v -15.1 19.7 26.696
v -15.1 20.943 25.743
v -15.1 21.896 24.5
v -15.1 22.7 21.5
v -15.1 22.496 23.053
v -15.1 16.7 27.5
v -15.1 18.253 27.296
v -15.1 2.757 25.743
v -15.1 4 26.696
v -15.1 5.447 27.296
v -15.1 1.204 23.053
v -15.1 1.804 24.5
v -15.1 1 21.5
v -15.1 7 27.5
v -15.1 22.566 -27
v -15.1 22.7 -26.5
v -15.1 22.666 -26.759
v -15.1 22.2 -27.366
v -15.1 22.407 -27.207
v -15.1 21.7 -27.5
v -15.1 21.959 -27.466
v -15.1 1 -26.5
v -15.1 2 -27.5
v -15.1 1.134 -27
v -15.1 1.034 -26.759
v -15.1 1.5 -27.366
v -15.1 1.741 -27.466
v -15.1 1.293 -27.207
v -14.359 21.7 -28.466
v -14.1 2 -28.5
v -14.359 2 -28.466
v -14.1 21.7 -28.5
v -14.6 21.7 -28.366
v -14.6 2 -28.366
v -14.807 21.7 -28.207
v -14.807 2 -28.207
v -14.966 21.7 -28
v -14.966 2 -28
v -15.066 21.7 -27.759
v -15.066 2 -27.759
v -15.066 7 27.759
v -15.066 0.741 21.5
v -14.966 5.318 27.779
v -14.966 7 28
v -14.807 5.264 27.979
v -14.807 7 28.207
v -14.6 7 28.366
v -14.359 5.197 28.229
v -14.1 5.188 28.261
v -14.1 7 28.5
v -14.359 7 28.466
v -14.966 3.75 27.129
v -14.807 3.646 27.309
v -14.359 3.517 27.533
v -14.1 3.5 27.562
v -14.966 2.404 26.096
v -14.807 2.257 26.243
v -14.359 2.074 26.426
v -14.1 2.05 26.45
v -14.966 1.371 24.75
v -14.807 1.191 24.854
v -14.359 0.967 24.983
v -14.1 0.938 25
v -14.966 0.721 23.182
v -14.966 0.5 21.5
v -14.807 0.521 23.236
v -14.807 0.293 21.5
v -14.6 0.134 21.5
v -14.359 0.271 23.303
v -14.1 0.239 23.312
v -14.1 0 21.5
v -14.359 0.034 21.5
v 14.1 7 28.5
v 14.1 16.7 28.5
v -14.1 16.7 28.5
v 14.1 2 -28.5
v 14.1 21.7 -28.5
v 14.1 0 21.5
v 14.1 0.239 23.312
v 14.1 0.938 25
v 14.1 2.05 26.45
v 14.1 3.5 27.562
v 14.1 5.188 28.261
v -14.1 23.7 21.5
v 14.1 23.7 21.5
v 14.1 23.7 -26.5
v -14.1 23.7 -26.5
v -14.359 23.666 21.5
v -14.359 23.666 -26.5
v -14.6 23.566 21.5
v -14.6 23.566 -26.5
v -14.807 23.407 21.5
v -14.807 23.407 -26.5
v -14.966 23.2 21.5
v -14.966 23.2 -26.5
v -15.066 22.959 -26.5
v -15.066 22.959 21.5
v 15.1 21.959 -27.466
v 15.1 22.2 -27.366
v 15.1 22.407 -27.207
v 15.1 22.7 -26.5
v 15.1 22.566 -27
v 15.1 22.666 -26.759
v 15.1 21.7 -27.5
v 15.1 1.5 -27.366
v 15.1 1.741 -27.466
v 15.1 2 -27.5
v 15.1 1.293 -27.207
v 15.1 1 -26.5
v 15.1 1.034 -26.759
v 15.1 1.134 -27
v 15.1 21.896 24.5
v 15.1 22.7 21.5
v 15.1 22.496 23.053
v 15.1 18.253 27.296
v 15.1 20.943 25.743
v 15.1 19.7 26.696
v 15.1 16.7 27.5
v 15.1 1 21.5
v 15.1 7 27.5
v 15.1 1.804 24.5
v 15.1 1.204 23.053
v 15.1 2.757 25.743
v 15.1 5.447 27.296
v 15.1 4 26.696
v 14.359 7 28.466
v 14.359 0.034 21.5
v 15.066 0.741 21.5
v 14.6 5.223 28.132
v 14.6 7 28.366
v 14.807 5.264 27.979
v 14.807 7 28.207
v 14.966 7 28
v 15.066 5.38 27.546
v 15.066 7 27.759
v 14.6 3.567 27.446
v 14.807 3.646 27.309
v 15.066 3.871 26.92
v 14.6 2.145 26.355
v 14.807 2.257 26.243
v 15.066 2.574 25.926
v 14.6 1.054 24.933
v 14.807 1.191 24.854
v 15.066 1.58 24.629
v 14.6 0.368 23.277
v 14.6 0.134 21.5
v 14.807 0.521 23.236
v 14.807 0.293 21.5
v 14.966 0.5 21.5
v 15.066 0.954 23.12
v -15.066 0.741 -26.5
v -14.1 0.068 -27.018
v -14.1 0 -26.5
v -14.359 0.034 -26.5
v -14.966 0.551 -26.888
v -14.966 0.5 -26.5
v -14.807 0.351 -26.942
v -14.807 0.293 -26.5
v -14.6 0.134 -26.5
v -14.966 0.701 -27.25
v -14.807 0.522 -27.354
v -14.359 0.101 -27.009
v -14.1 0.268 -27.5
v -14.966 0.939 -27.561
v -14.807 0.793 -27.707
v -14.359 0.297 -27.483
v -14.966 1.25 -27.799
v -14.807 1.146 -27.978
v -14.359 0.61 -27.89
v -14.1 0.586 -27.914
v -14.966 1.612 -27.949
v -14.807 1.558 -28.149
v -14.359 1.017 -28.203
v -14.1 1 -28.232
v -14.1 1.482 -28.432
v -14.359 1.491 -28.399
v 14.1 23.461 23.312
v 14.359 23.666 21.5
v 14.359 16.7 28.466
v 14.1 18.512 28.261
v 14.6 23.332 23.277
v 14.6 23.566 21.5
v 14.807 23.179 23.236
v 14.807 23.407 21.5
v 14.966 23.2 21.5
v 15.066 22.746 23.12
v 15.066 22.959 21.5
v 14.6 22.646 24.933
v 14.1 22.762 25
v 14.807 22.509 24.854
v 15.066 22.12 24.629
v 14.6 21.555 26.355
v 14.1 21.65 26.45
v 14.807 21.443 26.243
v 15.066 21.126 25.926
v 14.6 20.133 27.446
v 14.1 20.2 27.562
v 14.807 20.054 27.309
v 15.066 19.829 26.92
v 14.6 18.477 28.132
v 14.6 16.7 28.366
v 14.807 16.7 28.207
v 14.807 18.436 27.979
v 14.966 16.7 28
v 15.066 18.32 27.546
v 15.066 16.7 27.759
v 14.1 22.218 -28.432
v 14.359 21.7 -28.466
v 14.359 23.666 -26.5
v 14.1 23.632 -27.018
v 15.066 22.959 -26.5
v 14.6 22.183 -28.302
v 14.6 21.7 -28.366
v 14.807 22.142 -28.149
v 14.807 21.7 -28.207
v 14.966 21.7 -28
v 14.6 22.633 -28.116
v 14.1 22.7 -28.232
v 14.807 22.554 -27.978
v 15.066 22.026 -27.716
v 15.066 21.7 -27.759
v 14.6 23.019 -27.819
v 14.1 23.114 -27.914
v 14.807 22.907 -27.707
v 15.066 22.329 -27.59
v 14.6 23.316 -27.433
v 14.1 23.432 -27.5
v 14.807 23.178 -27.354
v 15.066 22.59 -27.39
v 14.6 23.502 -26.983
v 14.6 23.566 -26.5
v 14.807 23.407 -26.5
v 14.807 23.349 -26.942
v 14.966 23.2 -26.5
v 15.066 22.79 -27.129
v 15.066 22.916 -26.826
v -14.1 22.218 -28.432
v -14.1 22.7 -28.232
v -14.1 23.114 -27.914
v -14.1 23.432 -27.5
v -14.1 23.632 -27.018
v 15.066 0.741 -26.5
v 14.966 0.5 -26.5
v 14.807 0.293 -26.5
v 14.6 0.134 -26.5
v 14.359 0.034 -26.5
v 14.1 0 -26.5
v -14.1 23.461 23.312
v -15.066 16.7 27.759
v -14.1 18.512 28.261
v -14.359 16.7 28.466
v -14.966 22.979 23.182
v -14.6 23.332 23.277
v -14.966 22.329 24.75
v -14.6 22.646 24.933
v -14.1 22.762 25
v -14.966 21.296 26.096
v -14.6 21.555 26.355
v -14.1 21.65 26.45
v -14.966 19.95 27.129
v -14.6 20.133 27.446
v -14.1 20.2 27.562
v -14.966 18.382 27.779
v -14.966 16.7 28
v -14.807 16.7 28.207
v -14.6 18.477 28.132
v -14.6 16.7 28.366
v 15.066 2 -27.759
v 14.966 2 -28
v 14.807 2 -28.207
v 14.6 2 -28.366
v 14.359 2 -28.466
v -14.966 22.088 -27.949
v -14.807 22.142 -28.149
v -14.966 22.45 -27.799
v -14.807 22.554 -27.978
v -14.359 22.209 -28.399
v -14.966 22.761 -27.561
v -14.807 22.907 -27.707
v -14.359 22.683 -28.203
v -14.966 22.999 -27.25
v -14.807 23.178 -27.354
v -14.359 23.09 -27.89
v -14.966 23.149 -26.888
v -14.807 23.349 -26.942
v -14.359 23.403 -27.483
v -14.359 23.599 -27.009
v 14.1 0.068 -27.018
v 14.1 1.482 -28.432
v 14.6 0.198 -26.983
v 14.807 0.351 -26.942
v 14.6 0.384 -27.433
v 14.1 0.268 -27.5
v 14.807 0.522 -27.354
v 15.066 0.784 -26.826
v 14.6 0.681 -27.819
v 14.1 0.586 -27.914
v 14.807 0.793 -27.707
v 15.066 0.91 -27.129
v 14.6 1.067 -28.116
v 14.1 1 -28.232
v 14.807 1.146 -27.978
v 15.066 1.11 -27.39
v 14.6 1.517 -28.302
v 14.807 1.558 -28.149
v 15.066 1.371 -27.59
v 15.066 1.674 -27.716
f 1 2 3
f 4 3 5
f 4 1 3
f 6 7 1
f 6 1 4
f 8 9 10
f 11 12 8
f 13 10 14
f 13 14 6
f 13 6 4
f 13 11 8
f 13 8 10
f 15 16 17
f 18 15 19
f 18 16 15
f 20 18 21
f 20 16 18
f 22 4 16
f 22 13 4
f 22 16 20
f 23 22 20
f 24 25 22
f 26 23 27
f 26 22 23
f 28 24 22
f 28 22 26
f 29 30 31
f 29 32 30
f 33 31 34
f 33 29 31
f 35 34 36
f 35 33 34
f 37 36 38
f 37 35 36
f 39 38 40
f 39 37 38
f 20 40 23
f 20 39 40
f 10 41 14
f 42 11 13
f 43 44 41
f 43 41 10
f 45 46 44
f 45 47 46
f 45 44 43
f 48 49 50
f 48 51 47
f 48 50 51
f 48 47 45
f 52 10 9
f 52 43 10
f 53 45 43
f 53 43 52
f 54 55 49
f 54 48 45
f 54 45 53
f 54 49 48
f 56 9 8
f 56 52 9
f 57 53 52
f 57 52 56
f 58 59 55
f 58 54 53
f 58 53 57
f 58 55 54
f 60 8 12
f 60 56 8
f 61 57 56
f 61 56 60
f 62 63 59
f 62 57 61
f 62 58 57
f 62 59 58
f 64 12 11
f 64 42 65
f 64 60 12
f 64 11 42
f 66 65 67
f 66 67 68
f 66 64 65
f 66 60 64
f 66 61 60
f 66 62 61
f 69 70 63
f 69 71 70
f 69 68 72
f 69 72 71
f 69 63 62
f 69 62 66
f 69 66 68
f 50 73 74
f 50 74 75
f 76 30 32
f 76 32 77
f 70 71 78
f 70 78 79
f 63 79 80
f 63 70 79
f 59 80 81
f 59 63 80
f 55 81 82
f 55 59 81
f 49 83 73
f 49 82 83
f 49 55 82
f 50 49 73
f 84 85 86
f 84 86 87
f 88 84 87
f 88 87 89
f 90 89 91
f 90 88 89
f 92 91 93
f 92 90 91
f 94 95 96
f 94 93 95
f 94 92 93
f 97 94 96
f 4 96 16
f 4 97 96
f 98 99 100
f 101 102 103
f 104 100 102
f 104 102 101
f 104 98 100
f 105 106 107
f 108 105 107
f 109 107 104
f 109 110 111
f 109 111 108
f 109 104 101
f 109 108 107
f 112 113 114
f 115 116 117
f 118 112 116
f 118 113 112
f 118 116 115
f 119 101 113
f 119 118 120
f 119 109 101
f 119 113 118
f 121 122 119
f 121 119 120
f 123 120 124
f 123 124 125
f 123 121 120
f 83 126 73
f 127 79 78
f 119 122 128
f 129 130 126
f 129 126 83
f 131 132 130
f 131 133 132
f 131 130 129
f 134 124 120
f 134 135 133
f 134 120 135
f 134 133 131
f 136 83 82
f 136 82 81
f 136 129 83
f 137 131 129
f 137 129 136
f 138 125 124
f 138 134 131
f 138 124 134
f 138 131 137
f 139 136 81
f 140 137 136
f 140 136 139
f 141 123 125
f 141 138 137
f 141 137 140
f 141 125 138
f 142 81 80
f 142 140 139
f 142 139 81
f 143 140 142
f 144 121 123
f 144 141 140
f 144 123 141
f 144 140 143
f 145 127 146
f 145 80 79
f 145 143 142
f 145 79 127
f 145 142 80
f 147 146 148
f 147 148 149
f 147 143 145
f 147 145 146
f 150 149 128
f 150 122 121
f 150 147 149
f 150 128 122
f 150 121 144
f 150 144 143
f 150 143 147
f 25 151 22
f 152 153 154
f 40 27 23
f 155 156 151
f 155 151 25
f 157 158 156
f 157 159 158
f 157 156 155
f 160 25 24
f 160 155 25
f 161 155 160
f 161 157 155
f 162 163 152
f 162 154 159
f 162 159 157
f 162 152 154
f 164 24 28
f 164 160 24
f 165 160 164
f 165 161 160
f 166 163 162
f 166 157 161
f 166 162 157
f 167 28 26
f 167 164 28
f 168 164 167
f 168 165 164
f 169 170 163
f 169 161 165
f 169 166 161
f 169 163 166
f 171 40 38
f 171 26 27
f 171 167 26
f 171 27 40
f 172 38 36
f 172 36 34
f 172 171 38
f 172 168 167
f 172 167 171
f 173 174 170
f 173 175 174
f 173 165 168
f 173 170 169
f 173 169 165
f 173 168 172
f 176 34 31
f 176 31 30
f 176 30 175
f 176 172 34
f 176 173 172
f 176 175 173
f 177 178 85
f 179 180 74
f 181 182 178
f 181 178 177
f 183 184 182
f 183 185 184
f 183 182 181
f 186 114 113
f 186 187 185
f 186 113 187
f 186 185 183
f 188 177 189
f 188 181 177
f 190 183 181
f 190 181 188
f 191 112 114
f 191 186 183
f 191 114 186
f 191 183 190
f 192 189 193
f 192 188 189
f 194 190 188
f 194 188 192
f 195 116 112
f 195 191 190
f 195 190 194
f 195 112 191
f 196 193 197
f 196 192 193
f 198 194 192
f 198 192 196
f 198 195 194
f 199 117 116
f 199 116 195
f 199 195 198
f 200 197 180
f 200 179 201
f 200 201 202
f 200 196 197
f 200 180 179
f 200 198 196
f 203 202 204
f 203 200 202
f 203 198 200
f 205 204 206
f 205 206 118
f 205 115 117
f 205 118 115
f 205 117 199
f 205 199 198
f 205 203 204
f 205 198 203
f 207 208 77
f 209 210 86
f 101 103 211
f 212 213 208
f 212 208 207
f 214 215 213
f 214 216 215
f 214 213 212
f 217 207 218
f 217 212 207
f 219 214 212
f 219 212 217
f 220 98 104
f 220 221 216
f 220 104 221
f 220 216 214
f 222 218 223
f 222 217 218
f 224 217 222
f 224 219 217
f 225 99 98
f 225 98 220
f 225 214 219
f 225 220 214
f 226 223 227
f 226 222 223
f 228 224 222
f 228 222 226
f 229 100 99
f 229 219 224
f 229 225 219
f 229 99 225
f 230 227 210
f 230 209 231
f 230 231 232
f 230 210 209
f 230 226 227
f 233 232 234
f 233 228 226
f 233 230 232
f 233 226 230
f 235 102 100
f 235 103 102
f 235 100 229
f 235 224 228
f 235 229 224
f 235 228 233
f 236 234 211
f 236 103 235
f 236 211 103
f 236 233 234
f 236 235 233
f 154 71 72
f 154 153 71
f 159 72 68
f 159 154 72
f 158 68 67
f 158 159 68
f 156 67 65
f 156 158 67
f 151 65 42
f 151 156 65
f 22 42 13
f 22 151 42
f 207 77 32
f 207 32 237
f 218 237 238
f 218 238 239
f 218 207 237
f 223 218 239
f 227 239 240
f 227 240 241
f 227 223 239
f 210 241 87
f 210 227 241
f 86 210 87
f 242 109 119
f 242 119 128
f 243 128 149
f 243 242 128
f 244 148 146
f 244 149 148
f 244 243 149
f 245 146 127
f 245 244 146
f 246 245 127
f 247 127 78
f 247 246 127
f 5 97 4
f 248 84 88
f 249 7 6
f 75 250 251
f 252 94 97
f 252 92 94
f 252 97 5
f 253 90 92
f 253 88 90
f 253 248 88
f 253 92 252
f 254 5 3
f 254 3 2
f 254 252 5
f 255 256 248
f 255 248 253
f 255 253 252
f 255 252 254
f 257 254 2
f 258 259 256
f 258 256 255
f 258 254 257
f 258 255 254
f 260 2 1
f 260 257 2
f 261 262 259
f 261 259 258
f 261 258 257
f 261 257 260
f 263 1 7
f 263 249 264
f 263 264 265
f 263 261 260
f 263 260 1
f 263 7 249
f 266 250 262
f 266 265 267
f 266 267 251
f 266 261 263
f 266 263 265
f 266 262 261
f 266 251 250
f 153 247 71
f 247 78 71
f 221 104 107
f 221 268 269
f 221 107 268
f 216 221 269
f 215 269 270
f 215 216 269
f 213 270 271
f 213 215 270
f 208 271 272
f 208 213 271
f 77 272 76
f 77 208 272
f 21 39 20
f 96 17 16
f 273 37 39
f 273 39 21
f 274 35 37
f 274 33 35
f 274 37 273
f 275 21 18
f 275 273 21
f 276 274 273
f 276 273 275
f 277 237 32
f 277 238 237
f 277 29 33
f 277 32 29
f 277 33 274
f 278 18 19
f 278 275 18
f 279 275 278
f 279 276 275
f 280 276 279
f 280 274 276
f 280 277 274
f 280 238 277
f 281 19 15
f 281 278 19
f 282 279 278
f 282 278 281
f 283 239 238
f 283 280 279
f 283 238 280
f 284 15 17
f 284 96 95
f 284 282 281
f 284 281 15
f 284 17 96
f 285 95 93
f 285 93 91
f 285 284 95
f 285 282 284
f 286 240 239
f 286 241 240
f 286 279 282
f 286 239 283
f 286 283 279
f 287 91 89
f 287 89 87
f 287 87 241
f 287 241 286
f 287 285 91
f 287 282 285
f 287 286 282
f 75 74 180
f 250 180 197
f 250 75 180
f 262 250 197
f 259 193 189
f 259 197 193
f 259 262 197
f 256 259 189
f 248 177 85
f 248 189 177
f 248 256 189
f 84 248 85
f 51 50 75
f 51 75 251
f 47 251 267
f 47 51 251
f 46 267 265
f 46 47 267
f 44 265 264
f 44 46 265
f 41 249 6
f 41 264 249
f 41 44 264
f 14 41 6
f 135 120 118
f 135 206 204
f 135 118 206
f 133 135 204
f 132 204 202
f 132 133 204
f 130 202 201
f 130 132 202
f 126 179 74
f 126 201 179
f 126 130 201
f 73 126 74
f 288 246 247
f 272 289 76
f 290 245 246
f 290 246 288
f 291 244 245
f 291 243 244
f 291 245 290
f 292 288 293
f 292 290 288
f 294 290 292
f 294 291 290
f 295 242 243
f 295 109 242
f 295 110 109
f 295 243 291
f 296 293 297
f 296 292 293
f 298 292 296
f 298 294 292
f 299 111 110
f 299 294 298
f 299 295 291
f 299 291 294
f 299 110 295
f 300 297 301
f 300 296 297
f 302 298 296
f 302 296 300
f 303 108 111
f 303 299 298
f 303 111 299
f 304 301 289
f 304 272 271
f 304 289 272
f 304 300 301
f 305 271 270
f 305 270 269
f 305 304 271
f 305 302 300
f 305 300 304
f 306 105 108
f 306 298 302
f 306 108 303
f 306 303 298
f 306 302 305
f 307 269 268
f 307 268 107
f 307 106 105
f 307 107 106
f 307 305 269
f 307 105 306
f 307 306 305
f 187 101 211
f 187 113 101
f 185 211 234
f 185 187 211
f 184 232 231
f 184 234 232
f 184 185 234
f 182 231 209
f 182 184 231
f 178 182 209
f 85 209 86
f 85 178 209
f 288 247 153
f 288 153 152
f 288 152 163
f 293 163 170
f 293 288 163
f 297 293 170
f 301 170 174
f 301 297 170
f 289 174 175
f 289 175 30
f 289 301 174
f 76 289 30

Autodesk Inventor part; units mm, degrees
ref_plane "YZ Plane" through (0, 0, 0) normal (1, 0, 0) x (0, 1, 0)
ref_plane "XZ Plane" through (0, 0, 0) normal (0, 1, 0) x (-1, 0, 0)
ref_plane "XY Plane" through (0, 0, 0) normal (0, 0, 1) x (1, 0, 0)
sketch "Sketch1" plane through (0, 0, 0) normal (0, 1, 0) x (-1, 0, 0)
  line L0 (15.1, -28.5) -> (-15.1, -28.5)
  line L1 (-15.1, -28.5) -> (-15.1, 28.5)
  line L2 (-15.1, 28.5) -> (15.1, 28.5)
  line L3 (15.1, 28.5) -> (15.1, -28.5)
  dimension "d0" = 30.2
  dimension "d1" = 57
extrude "Extrusion1" add sketch "Sketch1" along normal blind 23.7
fillet "Fillet1" radius 2 2 edges at (0, 23.7, -28.5) (0, 0, -28.5)
fillet "Fillet2" radius 7 2 edges at (0, 23.7, 28.5) (0, 0, 28.5)
fillet "Fillet3" radius 1 16 edges at (15.1, 23.7, -2.5) (15.1, 23.1142, -27.9142) (15.1, 11.85, -28.5) (15.1, 0.5858, -27.9142) (15.1, 0, -2.5) (15.1, 2.0503, 26.4497) (15.1, 11.85, 28.5) (15.1, 21.6497, 26.4497) (-15.1, 21.6497, 26.4497) (-15.1, 11.85, 28.5) (-15.1, 2.0503, 26.4497) (-15.1, 0, -2.5) (-15.1, 0.5858, -27.9142) (-15.1, 11.85, -28.5) (-15.1, 23.1142, -27.9142) (-15.1, 23.7, -2.5)
properties part number "Lipo"
